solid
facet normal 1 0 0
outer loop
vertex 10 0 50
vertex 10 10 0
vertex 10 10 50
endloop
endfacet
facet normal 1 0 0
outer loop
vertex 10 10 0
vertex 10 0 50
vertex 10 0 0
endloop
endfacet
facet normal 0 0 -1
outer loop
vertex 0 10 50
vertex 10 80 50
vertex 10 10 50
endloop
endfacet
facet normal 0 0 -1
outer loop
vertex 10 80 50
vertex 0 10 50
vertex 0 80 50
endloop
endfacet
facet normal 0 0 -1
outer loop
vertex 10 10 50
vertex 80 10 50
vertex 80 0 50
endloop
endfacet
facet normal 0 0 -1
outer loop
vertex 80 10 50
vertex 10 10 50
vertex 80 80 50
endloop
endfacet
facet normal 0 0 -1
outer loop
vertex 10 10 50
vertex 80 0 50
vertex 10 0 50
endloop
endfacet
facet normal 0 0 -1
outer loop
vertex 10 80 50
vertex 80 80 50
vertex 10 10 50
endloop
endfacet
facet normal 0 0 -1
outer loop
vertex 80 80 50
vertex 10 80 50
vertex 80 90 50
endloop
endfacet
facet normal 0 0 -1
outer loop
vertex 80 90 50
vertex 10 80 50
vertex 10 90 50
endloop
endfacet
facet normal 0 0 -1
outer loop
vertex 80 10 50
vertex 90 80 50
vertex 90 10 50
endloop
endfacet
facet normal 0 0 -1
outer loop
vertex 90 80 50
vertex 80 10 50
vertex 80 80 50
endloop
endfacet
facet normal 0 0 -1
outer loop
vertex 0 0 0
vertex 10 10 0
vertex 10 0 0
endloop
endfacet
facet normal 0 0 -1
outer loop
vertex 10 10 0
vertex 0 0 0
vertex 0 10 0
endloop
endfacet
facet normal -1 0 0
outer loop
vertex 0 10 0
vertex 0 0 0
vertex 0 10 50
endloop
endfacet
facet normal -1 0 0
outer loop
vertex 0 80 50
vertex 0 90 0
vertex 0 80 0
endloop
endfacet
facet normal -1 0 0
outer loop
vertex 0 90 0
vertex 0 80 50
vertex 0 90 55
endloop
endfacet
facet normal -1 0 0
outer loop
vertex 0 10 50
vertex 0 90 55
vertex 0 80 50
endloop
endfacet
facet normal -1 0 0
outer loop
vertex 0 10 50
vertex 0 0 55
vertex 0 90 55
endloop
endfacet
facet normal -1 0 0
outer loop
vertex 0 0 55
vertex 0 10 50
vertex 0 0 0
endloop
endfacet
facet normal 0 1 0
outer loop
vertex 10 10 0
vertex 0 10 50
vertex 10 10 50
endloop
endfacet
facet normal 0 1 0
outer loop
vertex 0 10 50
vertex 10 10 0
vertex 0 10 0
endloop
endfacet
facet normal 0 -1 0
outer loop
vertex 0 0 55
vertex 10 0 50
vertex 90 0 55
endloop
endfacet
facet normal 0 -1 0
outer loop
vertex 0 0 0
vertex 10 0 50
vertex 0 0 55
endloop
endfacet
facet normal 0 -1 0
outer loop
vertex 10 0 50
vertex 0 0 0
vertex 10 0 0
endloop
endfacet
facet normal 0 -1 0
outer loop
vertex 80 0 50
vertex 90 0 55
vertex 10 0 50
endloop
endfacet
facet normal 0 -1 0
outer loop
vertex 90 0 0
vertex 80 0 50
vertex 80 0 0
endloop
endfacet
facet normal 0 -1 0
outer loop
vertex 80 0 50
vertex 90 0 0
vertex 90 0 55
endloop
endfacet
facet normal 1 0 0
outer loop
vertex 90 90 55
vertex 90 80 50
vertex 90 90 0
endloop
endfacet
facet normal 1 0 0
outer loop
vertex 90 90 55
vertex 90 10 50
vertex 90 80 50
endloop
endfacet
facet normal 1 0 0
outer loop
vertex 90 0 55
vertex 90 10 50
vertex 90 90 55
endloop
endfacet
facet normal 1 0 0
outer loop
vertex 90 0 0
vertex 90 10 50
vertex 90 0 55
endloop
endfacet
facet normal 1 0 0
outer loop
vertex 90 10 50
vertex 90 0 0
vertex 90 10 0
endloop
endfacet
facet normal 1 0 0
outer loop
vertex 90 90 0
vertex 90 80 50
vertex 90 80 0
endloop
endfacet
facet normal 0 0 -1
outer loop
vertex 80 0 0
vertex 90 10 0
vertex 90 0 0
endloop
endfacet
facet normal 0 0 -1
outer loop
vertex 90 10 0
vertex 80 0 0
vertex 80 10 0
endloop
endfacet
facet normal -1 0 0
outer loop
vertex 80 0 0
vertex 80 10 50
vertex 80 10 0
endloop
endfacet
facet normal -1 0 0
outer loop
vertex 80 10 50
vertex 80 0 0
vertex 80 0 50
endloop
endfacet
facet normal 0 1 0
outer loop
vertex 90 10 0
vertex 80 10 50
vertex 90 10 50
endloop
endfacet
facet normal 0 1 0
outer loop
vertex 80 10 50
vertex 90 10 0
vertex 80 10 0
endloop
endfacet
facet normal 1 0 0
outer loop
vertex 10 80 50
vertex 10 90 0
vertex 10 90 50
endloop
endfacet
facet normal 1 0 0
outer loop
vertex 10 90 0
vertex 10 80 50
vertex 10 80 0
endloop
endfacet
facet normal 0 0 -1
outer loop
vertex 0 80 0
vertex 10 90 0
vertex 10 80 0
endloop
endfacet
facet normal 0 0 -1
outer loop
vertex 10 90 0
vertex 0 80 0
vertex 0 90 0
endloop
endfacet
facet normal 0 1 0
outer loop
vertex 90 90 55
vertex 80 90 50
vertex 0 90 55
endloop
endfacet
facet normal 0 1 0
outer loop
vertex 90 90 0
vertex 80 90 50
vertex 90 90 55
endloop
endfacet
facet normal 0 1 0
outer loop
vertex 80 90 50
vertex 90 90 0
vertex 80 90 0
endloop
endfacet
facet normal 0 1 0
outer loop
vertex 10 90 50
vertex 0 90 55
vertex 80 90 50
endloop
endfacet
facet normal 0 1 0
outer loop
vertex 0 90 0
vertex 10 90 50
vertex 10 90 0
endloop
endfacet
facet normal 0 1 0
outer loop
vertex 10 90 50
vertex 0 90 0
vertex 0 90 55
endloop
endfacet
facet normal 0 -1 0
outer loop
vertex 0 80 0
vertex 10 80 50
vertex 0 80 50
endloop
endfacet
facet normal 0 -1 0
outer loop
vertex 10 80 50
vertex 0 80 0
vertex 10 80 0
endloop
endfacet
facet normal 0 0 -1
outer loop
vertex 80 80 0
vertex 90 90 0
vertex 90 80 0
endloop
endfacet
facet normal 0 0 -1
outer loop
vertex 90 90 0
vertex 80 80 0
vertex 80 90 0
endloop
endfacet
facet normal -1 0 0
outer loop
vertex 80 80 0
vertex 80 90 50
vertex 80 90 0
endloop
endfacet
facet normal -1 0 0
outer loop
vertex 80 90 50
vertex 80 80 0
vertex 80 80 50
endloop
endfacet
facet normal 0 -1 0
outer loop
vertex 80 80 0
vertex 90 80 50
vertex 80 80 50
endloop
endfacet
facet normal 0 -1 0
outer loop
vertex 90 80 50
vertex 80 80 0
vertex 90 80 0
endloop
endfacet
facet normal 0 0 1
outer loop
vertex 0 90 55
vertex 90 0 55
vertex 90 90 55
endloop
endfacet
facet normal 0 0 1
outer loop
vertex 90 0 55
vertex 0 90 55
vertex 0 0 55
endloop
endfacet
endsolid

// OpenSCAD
cube([10,10,50]);

translate([80,0,0])
cube([10,10,50]);

translate([0,80,0])
cube([10,10,50]);

translate([80,80,0])
cube([10,10,50]);

translate([0,0,50])
cube([90,90,5]);
